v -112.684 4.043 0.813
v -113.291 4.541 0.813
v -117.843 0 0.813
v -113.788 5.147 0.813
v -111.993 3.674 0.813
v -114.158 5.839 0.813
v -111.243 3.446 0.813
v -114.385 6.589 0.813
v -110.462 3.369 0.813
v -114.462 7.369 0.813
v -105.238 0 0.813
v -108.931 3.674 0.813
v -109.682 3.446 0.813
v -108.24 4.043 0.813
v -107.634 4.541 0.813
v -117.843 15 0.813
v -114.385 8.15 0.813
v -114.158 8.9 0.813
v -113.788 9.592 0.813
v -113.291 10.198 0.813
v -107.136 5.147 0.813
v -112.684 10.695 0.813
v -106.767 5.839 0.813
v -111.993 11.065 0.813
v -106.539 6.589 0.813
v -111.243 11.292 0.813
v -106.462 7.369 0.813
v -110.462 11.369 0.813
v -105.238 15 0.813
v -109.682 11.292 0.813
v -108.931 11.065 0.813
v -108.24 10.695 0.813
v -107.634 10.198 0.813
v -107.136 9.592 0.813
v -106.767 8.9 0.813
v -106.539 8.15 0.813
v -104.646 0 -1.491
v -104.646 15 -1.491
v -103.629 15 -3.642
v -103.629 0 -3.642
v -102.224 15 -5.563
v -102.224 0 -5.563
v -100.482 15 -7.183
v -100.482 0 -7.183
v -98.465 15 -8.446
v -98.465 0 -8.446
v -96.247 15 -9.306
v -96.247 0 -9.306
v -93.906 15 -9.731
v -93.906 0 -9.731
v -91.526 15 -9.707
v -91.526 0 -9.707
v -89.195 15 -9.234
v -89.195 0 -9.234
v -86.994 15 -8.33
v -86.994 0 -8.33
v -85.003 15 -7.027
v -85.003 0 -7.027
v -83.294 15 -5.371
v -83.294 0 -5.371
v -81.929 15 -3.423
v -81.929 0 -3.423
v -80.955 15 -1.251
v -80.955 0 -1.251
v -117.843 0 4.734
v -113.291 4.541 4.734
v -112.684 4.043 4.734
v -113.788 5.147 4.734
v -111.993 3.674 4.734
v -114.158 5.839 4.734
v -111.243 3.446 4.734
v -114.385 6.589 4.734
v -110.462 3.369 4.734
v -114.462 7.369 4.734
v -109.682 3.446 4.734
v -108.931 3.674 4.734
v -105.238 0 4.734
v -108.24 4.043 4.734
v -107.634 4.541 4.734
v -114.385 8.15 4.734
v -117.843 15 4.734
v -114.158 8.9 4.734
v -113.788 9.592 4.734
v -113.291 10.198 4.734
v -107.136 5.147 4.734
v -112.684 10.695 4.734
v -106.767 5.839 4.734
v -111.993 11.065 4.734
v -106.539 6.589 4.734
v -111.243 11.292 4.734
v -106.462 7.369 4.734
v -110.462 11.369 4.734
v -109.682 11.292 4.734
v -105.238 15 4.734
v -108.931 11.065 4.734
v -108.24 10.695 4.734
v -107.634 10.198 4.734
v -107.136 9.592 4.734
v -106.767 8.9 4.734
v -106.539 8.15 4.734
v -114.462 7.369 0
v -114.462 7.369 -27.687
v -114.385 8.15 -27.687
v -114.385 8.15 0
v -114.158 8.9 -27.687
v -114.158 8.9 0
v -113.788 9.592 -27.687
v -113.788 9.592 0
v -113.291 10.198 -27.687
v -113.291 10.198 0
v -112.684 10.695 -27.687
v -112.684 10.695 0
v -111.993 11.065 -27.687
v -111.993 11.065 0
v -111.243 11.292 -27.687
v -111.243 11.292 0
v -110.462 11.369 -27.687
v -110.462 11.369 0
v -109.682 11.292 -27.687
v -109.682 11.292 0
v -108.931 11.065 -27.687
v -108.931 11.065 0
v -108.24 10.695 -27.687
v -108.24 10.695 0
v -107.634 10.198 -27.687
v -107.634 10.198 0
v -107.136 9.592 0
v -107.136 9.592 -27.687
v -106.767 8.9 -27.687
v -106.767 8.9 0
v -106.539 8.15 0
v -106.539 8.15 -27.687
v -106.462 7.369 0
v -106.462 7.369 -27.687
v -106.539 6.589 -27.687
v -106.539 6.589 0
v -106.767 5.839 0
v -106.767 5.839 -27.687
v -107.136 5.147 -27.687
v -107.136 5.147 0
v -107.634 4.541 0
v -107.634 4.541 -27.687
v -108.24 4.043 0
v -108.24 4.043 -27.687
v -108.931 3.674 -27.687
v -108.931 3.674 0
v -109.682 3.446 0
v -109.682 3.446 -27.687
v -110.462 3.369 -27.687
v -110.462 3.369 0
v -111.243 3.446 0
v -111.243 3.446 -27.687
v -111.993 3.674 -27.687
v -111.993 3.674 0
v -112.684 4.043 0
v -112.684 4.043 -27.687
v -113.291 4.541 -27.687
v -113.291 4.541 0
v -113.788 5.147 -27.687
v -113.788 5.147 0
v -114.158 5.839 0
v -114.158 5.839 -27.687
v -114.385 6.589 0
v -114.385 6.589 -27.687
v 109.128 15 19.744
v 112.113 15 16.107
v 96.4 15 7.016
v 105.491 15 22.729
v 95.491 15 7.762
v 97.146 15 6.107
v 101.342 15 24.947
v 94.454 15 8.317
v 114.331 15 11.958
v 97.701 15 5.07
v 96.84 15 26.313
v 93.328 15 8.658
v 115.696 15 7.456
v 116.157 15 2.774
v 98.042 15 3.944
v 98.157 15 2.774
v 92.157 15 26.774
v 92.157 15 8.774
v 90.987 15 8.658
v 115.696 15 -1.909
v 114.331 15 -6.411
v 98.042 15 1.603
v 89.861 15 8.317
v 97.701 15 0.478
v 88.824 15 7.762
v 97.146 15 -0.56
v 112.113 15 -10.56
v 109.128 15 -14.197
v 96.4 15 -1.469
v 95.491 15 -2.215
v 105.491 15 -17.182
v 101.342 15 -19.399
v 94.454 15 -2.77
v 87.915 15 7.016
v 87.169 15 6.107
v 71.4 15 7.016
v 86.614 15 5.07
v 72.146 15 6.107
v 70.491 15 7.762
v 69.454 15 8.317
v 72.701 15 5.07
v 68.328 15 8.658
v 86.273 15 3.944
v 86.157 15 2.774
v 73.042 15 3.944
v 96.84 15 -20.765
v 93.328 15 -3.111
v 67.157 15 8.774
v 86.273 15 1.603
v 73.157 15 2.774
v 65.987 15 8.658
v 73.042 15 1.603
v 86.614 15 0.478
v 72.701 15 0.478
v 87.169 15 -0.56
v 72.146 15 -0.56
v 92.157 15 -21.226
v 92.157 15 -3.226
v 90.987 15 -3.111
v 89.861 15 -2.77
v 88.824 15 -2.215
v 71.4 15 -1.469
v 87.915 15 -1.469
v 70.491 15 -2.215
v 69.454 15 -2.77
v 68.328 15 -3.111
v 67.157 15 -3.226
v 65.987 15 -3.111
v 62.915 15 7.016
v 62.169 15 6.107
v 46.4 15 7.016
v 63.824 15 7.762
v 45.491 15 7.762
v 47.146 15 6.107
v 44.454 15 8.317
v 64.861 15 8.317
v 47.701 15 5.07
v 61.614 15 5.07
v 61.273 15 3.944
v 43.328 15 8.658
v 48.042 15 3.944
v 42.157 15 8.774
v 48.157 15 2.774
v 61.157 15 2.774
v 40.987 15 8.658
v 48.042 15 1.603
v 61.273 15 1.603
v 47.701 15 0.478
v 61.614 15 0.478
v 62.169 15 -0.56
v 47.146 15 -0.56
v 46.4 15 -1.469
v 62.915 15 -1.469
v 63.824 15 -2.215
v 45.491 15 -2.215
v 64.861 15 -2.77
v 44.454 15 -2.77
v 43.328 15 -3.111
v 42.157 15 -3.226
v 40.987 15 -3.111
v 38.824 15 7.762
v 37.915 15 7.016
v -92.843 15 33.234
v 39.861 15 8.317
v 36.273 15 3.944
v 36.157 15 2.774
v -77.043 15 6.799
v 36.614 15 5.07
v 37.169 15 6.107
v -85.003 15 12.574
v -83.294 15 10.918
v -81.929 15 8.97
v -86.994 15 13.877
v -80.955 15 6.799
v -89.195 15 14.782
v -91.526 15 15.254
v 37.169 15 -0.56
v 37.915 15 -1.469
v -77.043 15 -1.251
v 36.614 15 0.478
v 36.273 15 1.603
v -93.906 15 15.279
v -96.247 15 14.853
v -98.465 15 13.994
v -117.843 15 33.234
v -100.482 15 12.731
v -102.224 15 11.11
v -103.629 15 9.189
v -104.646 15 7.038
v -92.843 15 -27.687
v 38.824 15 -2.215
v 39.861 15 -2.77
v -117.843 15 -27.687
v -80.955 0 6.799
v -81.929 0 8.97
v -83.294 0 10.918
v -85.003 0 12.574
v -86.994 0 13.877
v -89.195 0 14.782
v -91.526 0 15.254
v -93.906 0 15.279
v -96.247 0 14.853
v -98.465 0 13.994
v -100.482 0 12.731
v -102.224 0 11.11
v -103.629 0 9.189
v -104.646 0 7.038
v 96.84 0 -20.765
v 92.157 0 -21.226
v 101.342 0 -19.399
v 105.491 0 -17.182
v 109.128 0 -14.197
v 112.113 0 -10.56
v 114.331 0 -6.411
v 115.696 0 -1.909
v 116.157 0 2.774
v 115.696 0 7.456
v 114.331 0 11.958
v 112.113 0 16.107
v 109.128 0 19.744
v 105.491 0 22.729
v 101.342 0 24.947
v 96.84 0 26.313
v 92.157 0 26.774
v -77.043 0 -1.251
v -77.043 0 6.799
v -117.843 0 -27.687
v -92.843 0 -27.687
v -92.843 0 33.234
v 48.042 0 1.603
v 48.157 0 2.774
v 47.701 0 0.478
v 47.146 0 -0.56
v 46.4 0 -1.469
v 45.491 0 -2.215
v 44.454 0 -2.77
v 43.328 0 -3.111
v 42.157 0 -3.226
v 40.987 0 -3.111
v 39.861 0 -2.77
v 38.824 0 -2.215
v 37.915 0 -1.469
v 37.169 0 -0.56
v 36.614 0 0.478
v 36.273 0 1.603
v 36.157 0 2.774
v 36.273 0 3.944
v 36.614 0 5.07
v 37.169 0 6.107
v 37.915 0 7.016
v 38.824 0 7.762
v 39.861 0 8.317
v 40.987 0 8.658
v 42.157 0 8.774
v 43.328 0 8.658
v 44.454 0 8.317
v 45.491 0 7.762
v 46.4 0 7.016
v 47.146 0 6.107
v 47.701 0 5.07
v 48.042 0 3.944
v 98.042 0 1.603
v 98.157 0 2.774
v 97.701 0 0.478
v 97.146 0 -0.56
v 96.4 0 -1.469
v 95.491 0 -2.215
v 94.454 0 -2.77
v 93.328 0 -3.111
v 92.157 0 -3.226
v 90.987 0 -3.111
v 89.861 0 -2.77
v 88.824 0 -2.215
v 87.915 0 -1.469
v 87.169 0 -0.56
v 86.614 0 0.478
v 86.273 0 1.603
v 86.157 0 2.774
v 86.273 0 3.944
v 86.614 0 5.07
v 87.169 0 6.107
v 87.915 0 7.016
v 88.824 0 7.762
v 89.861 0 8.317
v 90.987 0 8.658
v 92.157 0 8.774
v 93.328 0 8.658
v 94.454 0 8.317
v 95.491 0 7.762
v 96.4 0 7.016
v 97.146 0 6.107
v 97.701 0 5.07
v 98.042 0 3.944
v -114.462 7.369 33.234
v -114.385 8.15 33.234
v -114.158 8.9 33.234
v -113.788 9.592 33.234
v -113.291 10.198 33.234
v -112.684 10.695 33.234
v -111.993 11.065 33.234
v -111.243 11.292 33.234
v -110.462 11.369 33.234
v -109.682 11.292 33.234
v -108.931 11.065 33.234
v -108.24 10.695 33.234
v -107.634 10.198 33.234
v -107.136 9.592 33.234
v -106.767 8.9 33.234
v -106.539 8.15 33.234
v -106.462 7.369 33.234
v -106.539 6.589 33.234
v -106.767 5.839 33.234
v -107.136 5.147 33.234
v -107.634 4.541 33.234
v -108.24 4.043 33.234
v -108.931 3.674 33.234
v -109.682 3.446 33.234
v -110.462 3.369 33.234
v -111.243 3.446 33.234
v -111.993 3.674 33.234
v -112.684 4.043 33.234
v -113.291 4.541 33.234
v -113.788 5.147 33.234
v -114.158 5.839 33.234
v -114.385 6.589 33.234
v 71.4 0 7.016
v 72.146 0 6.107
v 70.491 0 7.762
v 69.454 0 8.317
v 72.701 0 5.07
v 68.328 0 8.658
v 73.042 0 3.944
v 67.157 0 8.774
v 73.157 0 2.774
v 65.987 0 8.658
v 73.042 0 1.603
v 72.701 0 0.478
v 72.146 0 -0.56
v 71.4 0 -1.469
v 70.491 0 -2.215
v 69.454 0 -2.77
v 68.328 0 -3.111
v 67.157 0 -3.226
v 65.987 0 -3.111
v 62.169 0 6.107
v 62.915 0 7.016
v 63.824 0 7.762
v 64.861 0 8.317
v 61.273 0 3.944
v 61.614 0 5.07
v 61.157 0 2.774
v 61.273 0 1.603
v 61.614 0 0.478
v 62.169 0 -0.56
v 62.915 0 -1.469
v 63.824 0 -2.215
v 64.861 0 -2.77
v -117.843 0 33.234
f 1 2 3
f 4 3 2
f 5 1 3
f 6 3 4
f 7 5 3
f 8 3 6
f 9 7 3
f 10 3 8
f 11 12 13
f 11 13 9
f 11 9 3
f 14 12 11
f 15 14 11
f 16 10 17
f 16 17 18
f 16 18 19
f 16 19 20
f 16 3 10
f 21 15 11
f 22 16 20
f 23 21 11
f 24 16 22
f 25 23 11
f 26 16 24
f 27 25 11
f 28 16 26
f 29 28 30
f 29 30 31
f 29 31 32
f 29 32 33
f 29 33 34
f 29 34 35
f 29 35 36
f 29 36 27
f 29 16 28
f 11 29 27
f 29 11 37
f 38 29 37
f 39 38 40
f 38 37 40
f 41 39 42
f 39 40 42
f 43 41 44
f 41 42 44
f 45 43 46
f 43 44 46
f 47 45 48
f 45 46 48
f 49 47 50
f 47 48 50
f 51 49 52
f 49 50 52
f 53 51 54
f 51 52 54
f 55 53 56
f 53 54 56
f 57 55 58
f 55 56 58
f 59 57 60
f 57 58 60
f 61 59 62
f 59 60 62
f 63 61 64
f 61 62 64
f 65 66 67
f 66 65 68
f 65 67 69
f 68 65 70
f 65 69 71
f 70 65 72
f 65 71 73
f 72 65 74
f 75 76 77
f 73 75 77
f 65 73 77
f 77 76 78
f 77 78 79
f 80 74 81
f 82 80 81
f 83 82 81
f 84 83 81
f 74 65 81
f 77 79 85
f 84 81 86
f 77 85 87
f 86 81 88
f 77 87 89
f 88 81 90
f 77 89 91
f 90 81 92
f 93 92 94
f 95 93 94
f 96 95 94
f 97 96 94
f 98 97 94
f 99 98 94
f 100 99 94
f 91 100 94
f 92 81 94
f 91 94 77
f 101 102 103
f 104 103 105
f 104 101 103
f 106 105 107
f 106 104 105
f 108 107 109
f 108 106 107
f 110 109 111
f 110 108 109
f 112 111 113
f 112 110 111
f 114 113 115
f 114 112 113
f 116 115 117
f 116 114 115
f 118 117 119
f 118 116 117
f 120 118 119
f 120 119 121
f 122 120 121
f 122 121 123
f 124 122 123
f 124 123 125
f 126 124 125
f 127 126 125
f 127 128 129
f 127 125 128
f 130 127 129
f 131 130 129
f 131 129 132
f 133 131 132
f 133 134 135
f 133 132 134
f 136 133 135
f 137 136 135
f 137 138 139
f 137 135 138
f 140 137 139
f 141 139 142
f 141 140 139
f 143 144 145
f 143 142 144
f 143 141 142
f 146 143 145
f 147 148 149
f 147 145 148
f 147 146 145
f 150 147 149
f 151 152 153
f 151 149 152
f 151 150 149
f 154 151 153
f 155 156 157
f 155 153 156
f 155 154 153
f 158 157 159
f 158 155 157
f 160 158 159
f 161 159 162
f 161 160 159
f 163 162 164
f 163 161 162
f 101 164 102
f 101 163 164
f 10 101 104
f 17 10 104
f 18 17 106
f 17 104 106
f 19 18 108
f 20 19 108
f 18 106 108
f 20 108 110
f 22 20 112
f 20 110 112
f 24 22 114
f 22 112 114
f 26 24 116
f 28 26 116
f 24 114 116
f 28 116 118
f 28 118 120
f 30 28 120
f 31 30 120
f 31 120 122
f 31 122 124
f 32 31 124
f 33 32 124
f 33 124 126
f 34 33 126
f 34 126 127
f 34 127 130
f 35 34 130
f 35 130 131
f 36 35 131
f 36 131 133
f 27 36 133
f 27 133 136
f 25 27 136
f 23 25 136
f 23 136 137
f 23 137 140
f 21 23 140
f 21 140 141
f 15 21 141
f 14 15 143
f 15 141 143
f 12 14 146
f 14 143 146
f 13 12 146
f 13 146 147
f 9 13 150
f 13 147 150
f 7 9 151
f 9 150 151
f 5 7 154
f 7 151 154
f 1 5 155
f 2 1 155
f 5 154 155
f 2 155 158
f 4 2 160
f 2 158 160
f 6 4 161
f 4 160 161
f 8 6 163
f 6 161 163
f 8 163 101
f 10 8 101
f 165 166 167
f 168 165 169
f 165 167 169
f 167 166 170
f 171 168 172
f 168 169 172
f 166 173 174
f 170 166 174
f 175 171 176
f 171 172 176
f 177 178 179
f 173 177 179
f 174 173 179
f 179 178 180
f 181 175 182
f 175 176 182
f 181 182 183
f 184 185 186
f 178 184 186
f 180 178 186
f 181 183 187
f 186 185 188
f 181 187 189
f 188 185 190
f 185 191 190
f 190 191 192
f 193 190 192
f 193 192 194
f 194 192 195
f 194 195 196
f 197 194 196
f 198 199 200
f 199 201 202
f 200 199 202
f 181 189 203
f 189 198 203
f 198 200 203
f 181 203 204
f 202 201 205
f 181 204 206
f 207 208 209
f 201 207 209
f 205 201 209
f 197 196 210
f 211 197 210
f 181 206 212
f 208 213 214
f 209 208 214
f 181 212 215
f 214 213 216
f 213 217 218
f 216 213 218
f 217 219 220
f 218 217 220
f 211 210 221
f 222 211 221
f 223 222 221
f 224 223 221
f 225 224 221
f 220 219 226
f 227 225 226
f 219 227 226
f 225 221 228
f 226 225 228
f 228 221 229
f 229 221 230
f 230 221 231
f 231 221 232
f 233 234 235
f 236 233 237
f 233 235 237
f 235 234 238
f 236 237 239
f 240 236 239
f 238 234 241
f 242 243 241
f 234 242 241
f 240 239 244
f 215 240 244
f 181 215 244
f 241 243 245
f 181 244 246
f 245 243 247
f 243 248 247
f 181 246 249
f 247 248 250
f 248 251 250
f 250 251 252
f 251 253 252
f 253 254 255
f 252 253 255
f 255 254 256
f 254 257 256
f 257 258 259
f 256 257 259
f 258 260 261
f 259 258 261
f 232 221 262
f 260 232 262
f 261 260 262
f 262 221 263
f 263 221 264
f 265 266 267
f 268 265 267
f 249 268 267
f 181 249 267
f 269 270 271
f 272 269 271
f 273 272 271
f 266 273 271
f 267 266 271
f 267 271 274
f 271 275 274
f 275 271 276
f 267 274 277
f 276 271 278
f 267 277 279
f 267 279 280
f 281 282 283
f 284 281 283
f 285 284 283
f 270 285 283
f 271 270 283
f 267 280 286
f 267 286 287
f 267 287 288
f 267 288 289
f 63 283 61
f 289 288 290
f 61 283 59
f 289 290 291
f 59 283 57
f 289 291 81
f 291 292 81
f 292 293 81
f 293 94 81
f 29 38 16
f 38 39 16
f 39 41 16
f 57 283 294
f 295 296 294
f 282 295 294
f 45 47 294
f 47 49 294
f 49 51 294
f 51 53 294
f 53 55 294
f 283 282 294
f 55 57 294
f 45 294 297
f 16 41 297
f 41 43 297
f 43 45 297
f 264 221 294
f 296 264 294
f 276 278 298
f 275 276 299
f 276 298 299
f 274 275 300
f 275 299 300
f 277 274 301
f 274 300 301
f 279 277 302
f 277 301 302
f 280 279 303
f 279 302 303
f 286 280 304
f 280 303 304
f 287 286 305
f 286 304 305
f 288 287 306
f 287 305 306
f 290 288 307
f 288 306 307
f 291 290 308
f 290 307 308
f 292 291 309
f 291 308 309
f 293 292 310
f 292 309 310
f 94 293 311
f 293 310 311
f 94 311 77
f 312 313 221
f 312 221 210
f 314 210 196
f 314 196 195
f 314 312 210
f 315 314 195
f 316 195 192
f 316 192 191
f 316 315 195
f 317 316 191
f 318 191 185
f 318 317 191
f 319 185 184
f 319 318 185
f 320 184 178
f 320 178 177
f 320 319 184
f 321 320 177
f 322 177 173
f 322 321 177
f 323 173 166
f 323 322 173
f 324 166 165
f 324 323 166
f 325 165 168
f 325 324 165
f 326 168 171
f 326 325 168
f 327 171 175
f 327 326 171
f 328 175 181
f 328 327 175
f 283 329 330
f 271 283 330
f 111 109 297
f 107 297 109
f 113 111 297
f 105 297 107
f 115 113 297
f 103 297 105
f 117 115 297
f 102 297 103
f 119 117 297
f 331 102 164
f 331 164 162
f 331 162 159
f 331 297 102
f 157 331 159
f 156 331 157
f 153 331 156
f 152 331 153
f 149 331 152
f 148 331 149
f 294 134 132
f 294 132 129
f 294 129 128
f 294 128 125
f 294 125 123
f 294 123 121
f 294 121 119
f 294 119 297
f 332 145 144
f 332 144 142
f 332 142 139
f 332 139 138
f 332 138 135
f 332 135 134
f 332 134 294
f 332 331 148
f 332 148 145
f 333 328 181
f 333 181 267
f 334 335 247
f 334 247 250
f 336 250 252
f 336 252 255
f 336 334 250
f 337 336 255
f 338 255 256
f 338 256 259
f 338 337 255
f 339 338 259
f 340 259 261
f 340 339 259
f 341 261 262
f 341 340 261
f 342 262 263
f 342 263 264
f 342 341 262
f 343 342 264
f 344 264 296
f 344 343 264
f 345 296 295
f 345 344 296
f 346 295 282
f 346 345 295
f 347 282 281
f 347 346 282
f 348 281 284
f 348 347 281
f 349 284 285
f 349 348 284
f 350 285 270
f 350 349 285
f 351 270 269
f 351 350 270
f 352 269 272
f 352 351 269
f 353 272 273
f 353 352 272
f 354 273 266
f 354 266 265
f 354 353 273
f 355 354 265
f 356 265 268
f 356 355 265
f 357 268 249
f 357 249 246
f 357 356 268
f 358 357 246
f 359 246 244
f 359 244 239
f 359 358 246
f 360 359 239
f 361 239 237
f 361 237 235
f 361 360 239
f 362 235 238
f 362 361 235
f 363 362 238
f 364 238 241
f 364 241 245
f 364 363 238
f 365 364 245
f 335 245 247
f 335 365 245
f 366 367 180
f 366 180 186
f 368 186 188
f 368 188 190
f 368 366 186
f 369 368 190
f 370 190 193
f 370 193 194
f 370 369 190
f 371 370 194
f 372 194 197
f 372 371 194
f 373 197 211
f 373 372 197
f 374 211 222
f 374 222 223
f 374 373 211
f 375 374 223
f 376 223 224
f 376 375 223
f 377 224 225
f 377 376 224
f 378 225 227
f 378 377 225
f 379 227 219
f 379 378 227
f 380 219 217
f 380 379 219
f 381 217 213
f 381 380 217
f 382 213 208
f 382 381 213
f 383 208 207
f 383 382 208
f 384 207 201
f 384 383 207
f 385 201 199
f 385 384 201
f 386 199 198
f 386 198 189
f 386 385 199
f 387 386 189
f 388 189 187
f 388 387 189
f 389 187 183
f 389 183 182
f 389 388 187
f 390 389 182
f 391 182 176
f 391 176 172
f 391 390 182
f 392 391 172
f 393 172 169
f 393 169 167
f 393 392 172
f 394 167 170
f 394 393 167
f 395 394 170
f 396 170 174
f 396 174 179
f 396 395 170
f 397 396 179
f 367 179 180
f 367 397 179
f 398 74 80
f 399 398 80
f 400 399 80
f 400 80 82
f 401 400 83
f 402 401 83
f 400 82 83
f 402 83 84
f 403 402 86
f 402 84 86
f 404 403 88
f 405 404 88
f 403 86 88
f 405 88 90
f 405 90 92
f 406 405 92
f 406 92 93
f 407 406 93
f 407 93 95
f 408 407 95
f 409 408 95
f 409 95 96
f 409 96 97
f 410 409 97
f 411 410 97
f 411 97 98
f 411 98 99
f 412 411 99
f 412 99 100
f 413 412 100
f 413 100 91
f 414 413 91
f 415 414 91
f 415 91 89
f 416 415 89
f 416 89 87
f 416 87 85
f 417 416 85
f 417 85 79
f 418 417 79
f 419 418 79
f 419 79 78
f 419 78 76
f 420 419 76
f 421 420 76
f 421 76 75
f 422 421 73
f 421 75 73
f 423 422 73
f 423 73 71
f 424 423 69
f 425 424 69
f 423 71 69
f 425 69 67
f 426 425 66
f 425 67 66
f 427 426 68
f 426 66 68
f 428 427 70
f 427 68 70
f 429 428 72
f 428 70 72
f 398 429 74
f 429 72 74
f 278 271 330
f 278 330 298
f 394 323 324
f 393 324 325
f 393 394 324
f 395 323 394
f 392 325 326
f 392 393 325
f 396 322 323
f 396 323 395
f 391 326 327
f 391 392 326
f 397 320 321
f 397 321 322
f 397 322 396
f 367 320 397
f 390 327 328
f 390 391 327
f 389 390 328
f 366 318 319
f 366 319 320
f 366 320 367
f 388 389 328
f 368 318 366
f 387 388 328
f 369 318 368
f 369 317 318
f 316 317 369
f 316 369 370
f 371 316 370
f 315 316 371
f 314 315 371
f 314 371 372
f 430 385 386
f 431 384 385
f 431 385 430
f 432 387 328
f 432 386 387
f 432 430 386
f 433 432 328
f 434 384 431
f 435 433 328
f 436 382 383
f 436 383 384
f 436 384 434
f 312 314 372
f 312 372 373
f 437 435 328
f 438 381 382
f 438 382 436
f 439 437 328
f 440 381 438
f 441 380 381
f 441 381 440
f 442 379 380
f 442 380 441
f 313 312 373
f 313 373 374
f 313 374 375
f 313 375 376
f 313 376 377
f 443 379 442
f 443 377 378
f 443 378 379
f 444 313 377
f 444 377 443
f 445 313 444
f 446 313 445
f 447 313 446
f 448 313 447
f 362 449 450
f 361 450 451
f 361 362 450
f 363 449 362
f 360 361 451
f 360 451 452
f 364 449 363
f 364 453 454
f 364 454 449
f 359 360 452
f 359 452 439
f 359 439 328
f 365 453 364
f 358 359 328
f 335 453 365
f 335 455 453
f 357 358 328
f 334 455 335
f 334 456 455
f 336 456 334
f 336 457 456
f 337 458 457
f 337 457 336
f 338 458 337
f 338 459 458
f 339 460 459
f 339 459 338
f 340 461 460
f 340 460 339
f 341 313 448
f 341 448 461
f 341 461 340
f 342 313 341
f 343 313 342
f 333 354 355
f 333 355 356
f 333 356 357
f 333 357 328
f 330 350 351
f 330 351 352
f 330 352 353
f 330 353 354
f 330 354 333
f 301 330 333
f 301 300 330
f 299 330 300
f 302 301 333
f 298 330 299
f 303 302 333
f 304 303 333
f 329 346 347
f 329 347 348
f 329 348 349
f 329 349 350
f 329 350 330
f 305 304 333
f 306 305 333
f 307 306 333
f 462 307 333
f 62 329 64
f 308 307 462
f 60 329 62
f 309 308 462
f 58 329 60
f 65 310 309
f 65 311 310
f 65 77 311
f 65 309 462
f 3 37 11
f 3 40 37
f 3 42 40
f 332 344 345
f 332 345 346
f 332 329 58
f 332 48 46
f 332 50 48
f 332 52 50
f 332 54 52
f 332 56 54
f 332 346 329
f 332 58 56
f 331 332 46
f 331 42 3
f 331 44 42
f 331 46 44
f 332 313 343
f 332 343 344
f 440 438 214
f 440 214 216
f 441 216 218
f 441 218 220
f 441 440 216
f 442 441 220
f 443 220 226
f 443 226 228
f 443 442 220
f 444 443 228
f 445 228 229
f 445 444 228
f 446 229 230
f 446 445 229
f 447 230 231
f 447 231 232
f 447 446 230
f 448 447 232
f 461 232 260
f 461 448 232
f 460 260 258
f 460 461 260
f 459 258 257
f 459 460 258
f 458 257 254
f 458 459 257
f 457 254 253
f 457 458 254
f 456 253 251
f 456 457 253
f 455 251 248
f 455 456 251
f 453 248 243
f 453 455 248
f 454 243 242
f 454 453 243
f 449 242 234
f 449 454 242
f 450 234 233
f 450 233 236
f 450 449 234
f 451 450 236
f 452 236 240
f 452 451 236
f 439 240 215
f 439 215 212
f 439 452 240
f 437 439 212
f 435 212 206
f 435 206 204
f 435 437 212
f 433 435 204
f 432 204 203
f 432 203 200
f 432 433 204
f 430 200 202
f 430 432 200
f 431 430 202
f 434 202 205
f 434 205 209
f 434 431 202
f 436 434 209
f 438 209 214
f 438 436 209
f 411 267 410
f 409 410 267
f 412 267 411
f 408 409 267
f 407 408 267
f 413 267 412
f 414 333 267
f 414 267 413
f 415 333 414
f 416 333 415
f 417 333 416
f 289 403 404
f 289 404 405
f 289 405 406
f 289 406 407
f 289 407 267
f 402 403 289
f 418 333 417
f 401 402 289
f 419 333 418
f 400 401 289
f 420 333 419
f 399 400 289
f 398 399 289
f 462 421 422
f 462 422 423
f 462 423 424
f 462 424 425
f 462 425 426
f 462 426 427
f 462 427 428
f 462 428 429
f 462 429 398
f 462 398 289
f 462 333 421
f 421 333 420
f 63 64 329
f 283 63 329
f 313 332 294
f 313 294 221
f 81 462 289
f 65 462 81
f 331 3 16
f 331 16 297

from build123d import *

# Parameters (mm, degrees)
SKETCH1_R               = 6
BOSS_EXTRUDE1_DEPTH     = 15
SKETCH2_R               = 4
CUT_EXTRUDE1_DEPTH      = 28.686687264
CUT_EXTRUDE1_DEPTH_BACK = 34.233997448
SKETCH3_W               = 25.445516604
SKETCH3_H               = 3.920684712
CUT_EXTRUDE2_DEPTH      = 16


with BuildPart() as part:
    # Sketch1 → Boss-Extrude1 (new body)
    with BuildSketch(Plane(origin=(0, 0, 0), x_dir=(1, 0, 0), z_dir=(0, 1, 0))):
        with BuildLine():
            Line((-92.842511891, 27.686687264), (92.157488109, 21.226344908))
            ThreePointArc((92.157488109, 21.226344908), (116.157488109, -2.773655092), (92.157488109, -26.773655092))
            Line((92.157488109, -26.773655092), (-92.842511891, -33.233997448))
            Line((-92.842511891, -33.233997448), (-117.842511891, -33.233997448))
            Line((-117.842511891, -33.233997448), (-117.842511891, 27.686687264))
            Line((-117.842511891, 27.686687264), (-92.842511891, 27.686687264))
        make_face()
        with Locations((67.157488109, -2.773655092)):
            Circle(SKETCH1_R, mode=Mode.SUBTRACT)
        with Locations((42.157488109, -2.773655092)):
            Circle(SKETCH1_R, mode=Mode.SUBTRACT)
        with Locations((92.157488109, -2.773655092)):
            Circle(SKETCH1_R, mode=Mode.SUBTRACT)
        with BuildLine():
            Line((-80.95546537, 1.251344908), (-77.042511891, 1.251344908))
            Line((-77.042511891, 1.251344908), (-77.042511891, -6.798655092))
            Line((-77.042511891, -6.798655092), (-80.95546537, -6.798655092))
            ThreePointArc((-80.95546537, -6.798655092), (-105.392511891, -2.773655092), (-80.95546537, 1.251344908))
        make_face(mode=Mode.SUBTRACT)
    extrude(amount=BOSS_EXTRUDE1_DEPTH)

    # Sketch2 → Cut-Extrude1 (cut, two sides)
    with BuildSketch(Plane(origin=(0.426421377, 0, 0), x_dir=(-1, 0, 0), z_dir=(0, 0, -1))) as cut_extrude1_sk:
        with Locations((110.888582208, 7.369250935)):
            Circle(SKETCH2_R)
    extrude(amount=CUT_EXTRUDE1_DEPTH, mode=Mode.SUBTRACT)
    extrude(cut_extrude1_sk.sketch, amount=-CUT_EXTRUDE1_DEPTH_BACK, mode=Mode.SUBTRACT)

    # Sketch3 → Cut-Extrude2 (cut, through all)
    with BuildSketch(Plane(origin=(0, 15, 0), x_dir=(1, 0, 0), z_dir=(0, 1, 0))):
        with Locations((-111.290746627, -2.773655092)):
            Rectangle(SKETCH3_W, SKETCH3_H)
    extrude(amount=-CUT_EXTRUDE2_DEPTH, mode=Mode.SUBTRACT)


solid = part.part
